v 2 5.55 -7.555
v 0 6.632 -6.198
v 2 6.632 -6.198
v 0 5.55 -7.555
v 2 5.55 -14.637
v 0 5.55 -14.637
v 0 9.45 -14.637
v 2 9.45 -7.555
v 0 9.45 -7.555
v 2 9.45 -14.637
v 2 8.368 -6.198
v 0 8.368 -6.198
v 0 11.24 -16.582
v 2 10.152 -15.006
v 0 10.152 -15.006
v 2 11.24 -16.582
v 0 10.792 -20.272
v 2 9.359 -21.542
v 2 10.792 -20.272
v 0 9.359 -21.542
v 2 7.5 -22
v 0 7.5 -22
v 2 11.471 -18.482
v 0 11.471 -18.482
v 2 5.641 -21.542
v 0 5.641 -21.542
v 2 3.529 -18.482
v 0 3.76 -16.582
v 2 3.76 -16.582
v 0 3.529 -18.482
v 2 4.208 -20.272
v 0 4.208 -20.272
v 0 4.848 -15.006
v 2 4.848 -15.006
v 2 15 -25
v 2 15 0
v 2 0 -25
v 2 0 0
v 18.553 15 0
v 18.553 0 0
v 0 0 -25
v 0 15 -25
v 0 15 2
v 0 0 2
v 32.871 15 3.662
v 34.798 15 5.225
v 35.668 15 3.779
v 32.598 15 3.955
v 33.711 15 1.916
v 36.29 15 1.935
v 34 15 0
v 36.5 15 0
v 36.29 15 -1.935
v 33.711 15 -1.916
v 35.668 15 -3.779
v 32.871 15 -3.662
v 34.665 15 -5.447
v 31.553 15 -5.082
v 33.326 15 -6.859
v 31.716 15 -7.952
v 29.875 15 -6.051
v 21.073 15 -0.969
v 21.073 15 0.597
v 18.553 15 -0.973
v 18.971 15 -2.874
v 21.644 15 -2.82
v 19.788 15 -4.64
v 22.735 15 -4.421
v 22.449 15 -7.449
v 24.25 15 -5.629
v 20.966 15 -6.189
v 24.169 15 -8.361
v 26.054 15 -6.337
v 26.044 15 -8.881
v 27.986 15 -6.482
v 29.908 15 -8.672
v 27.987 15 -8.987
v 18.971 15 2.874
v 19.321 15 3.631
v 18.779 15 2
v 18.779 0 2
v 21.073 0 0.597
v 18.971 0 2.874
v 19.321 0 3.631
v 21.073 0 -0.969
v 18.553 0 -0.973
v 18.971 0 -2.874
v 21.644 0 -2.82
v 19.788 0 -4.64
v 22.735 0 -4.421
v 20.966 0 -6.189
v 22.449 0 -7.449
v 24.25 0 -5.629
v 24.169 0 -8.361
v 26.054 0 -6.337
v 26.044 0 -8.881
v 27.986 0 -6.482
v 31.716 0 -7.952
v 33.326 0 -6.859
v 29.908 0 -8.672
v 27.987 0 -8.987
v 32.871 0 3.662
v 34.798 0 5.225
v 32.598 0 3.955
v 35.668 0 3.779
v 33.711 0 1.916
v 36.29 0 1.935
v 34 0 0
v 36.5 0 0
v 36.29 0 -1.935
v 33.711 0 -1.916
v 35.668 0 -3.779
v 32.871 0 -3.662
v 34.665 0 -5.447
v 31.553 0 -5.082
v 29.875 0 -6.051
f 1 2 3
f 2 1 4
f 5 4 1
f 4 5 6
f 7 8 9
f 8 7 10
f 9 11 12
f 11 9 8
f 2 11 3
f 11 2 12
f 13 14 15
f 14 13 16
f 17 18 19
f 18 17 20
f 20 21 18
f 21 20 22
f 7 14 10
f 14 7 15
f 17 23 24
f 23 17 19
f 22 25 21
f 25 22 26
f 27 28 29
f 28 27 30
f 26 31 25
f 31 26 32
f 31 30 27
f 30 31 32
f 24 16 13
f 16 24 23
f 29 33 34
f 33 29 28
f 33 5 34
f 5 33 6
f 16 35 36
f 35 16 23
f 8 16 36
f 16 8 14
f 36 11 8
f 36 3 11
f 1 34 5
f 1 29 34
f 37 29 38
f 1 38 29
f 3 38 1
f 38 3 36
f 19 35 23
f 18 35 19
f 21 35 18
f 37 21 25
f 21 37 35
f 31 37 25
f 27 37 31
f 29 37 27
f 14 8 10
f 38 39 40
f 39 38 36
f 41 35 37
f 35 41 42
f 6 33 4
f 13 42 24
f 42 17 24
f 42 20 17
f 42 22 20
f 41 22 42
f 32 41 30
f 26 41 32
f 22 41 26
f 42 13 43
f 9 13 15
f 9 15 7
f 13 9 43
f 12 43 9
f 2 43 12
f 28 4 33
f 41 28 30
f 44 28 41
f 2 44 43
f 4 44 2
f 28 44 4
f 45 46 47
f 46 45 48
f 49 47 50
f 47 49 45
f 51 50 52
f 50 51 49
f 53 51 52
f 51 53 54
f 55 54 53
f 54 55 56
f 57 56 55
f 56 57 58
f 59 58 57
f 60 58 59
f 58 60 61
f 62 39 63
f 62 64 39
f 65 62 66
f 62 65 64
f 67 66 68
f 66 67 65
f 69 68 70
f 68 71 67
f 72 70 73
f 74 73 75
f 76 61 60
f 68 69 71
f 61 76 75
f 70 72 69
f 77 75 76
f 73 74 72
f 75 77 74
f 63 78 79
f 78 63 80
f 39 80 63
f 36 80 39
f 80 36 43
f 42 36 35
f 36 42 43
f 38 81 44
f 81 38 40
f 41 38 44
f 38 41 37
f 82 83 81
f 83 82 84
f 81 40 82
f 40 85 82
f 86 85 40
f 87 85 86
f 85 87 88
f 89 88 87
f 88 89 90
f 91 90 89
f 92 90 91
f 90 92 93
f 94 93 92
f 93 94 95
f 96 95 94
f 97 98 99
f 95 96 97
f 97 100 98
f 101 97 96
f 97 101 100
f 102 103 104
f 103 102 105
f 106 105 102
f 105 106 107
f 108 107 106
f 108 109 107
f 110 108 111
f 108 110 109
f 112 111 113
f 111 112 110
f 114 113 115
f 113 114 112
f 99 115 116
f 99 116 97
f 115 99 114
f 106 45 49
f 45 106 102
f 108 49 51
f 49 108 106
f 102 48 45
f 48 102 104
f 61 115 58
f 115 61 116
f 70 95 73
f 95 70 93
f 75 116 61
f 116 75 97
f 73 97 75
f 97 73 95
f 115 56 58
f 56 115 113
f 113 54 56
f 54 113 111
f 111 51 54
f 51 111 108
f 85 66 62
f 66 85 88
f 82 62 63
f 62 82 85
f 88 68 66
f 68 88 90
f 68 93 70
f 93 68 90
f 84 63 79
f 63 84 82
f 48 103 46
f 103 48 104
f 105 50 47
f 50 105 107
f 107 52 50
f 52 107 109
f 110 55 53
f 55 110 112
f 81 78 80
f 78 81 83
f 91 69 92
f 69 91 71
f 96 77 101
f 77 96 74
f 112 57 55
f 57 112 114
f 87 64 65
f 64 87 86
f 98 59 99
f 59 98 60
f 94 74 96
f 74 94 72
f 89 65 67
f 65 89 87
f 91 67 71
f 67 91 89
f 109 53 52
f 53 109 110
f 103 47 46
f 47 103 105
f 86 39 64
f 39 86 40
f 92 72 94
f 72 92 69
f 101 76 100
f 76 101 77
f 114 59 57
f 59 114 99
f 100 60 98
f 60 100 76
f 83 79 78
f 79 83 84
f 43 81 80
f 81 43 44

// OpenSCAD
t=2;
w=15;
lv=25;
lh=20;
d_ex=18;
d_in=13;
d_t1=8;
d_t2=4;
h_t=10;

cube([lh,w,t]);
translate([0,0,-lv])
difference() {
    cube([t,w,lv]);
    translate([1,w/2,lv-h_t-d_t1]) rotate([0,90,0])
    union() {
        hull() {
            cylinder(d=d_t2,h=t+2,center=true);
            translate([-h_t,0,0])
                cylinder(d=d_t2,h=t+2,center=true);
        }
        cylinder(d=d_t1,h=t+2,center=true);
    }
}
translate([lh+w/2,w,0]) rotate([90,0,0])
difference() {
  cylinder(d=d_ex,h=w);
    translate([0,0,-1])
    union() {
        cylinder(d=d_in,h=w+2);
        translate([-w/3,-w/8,0]) rotate([0,0,30])
            cube([w+t+2,w,w+2]);
    }
}
